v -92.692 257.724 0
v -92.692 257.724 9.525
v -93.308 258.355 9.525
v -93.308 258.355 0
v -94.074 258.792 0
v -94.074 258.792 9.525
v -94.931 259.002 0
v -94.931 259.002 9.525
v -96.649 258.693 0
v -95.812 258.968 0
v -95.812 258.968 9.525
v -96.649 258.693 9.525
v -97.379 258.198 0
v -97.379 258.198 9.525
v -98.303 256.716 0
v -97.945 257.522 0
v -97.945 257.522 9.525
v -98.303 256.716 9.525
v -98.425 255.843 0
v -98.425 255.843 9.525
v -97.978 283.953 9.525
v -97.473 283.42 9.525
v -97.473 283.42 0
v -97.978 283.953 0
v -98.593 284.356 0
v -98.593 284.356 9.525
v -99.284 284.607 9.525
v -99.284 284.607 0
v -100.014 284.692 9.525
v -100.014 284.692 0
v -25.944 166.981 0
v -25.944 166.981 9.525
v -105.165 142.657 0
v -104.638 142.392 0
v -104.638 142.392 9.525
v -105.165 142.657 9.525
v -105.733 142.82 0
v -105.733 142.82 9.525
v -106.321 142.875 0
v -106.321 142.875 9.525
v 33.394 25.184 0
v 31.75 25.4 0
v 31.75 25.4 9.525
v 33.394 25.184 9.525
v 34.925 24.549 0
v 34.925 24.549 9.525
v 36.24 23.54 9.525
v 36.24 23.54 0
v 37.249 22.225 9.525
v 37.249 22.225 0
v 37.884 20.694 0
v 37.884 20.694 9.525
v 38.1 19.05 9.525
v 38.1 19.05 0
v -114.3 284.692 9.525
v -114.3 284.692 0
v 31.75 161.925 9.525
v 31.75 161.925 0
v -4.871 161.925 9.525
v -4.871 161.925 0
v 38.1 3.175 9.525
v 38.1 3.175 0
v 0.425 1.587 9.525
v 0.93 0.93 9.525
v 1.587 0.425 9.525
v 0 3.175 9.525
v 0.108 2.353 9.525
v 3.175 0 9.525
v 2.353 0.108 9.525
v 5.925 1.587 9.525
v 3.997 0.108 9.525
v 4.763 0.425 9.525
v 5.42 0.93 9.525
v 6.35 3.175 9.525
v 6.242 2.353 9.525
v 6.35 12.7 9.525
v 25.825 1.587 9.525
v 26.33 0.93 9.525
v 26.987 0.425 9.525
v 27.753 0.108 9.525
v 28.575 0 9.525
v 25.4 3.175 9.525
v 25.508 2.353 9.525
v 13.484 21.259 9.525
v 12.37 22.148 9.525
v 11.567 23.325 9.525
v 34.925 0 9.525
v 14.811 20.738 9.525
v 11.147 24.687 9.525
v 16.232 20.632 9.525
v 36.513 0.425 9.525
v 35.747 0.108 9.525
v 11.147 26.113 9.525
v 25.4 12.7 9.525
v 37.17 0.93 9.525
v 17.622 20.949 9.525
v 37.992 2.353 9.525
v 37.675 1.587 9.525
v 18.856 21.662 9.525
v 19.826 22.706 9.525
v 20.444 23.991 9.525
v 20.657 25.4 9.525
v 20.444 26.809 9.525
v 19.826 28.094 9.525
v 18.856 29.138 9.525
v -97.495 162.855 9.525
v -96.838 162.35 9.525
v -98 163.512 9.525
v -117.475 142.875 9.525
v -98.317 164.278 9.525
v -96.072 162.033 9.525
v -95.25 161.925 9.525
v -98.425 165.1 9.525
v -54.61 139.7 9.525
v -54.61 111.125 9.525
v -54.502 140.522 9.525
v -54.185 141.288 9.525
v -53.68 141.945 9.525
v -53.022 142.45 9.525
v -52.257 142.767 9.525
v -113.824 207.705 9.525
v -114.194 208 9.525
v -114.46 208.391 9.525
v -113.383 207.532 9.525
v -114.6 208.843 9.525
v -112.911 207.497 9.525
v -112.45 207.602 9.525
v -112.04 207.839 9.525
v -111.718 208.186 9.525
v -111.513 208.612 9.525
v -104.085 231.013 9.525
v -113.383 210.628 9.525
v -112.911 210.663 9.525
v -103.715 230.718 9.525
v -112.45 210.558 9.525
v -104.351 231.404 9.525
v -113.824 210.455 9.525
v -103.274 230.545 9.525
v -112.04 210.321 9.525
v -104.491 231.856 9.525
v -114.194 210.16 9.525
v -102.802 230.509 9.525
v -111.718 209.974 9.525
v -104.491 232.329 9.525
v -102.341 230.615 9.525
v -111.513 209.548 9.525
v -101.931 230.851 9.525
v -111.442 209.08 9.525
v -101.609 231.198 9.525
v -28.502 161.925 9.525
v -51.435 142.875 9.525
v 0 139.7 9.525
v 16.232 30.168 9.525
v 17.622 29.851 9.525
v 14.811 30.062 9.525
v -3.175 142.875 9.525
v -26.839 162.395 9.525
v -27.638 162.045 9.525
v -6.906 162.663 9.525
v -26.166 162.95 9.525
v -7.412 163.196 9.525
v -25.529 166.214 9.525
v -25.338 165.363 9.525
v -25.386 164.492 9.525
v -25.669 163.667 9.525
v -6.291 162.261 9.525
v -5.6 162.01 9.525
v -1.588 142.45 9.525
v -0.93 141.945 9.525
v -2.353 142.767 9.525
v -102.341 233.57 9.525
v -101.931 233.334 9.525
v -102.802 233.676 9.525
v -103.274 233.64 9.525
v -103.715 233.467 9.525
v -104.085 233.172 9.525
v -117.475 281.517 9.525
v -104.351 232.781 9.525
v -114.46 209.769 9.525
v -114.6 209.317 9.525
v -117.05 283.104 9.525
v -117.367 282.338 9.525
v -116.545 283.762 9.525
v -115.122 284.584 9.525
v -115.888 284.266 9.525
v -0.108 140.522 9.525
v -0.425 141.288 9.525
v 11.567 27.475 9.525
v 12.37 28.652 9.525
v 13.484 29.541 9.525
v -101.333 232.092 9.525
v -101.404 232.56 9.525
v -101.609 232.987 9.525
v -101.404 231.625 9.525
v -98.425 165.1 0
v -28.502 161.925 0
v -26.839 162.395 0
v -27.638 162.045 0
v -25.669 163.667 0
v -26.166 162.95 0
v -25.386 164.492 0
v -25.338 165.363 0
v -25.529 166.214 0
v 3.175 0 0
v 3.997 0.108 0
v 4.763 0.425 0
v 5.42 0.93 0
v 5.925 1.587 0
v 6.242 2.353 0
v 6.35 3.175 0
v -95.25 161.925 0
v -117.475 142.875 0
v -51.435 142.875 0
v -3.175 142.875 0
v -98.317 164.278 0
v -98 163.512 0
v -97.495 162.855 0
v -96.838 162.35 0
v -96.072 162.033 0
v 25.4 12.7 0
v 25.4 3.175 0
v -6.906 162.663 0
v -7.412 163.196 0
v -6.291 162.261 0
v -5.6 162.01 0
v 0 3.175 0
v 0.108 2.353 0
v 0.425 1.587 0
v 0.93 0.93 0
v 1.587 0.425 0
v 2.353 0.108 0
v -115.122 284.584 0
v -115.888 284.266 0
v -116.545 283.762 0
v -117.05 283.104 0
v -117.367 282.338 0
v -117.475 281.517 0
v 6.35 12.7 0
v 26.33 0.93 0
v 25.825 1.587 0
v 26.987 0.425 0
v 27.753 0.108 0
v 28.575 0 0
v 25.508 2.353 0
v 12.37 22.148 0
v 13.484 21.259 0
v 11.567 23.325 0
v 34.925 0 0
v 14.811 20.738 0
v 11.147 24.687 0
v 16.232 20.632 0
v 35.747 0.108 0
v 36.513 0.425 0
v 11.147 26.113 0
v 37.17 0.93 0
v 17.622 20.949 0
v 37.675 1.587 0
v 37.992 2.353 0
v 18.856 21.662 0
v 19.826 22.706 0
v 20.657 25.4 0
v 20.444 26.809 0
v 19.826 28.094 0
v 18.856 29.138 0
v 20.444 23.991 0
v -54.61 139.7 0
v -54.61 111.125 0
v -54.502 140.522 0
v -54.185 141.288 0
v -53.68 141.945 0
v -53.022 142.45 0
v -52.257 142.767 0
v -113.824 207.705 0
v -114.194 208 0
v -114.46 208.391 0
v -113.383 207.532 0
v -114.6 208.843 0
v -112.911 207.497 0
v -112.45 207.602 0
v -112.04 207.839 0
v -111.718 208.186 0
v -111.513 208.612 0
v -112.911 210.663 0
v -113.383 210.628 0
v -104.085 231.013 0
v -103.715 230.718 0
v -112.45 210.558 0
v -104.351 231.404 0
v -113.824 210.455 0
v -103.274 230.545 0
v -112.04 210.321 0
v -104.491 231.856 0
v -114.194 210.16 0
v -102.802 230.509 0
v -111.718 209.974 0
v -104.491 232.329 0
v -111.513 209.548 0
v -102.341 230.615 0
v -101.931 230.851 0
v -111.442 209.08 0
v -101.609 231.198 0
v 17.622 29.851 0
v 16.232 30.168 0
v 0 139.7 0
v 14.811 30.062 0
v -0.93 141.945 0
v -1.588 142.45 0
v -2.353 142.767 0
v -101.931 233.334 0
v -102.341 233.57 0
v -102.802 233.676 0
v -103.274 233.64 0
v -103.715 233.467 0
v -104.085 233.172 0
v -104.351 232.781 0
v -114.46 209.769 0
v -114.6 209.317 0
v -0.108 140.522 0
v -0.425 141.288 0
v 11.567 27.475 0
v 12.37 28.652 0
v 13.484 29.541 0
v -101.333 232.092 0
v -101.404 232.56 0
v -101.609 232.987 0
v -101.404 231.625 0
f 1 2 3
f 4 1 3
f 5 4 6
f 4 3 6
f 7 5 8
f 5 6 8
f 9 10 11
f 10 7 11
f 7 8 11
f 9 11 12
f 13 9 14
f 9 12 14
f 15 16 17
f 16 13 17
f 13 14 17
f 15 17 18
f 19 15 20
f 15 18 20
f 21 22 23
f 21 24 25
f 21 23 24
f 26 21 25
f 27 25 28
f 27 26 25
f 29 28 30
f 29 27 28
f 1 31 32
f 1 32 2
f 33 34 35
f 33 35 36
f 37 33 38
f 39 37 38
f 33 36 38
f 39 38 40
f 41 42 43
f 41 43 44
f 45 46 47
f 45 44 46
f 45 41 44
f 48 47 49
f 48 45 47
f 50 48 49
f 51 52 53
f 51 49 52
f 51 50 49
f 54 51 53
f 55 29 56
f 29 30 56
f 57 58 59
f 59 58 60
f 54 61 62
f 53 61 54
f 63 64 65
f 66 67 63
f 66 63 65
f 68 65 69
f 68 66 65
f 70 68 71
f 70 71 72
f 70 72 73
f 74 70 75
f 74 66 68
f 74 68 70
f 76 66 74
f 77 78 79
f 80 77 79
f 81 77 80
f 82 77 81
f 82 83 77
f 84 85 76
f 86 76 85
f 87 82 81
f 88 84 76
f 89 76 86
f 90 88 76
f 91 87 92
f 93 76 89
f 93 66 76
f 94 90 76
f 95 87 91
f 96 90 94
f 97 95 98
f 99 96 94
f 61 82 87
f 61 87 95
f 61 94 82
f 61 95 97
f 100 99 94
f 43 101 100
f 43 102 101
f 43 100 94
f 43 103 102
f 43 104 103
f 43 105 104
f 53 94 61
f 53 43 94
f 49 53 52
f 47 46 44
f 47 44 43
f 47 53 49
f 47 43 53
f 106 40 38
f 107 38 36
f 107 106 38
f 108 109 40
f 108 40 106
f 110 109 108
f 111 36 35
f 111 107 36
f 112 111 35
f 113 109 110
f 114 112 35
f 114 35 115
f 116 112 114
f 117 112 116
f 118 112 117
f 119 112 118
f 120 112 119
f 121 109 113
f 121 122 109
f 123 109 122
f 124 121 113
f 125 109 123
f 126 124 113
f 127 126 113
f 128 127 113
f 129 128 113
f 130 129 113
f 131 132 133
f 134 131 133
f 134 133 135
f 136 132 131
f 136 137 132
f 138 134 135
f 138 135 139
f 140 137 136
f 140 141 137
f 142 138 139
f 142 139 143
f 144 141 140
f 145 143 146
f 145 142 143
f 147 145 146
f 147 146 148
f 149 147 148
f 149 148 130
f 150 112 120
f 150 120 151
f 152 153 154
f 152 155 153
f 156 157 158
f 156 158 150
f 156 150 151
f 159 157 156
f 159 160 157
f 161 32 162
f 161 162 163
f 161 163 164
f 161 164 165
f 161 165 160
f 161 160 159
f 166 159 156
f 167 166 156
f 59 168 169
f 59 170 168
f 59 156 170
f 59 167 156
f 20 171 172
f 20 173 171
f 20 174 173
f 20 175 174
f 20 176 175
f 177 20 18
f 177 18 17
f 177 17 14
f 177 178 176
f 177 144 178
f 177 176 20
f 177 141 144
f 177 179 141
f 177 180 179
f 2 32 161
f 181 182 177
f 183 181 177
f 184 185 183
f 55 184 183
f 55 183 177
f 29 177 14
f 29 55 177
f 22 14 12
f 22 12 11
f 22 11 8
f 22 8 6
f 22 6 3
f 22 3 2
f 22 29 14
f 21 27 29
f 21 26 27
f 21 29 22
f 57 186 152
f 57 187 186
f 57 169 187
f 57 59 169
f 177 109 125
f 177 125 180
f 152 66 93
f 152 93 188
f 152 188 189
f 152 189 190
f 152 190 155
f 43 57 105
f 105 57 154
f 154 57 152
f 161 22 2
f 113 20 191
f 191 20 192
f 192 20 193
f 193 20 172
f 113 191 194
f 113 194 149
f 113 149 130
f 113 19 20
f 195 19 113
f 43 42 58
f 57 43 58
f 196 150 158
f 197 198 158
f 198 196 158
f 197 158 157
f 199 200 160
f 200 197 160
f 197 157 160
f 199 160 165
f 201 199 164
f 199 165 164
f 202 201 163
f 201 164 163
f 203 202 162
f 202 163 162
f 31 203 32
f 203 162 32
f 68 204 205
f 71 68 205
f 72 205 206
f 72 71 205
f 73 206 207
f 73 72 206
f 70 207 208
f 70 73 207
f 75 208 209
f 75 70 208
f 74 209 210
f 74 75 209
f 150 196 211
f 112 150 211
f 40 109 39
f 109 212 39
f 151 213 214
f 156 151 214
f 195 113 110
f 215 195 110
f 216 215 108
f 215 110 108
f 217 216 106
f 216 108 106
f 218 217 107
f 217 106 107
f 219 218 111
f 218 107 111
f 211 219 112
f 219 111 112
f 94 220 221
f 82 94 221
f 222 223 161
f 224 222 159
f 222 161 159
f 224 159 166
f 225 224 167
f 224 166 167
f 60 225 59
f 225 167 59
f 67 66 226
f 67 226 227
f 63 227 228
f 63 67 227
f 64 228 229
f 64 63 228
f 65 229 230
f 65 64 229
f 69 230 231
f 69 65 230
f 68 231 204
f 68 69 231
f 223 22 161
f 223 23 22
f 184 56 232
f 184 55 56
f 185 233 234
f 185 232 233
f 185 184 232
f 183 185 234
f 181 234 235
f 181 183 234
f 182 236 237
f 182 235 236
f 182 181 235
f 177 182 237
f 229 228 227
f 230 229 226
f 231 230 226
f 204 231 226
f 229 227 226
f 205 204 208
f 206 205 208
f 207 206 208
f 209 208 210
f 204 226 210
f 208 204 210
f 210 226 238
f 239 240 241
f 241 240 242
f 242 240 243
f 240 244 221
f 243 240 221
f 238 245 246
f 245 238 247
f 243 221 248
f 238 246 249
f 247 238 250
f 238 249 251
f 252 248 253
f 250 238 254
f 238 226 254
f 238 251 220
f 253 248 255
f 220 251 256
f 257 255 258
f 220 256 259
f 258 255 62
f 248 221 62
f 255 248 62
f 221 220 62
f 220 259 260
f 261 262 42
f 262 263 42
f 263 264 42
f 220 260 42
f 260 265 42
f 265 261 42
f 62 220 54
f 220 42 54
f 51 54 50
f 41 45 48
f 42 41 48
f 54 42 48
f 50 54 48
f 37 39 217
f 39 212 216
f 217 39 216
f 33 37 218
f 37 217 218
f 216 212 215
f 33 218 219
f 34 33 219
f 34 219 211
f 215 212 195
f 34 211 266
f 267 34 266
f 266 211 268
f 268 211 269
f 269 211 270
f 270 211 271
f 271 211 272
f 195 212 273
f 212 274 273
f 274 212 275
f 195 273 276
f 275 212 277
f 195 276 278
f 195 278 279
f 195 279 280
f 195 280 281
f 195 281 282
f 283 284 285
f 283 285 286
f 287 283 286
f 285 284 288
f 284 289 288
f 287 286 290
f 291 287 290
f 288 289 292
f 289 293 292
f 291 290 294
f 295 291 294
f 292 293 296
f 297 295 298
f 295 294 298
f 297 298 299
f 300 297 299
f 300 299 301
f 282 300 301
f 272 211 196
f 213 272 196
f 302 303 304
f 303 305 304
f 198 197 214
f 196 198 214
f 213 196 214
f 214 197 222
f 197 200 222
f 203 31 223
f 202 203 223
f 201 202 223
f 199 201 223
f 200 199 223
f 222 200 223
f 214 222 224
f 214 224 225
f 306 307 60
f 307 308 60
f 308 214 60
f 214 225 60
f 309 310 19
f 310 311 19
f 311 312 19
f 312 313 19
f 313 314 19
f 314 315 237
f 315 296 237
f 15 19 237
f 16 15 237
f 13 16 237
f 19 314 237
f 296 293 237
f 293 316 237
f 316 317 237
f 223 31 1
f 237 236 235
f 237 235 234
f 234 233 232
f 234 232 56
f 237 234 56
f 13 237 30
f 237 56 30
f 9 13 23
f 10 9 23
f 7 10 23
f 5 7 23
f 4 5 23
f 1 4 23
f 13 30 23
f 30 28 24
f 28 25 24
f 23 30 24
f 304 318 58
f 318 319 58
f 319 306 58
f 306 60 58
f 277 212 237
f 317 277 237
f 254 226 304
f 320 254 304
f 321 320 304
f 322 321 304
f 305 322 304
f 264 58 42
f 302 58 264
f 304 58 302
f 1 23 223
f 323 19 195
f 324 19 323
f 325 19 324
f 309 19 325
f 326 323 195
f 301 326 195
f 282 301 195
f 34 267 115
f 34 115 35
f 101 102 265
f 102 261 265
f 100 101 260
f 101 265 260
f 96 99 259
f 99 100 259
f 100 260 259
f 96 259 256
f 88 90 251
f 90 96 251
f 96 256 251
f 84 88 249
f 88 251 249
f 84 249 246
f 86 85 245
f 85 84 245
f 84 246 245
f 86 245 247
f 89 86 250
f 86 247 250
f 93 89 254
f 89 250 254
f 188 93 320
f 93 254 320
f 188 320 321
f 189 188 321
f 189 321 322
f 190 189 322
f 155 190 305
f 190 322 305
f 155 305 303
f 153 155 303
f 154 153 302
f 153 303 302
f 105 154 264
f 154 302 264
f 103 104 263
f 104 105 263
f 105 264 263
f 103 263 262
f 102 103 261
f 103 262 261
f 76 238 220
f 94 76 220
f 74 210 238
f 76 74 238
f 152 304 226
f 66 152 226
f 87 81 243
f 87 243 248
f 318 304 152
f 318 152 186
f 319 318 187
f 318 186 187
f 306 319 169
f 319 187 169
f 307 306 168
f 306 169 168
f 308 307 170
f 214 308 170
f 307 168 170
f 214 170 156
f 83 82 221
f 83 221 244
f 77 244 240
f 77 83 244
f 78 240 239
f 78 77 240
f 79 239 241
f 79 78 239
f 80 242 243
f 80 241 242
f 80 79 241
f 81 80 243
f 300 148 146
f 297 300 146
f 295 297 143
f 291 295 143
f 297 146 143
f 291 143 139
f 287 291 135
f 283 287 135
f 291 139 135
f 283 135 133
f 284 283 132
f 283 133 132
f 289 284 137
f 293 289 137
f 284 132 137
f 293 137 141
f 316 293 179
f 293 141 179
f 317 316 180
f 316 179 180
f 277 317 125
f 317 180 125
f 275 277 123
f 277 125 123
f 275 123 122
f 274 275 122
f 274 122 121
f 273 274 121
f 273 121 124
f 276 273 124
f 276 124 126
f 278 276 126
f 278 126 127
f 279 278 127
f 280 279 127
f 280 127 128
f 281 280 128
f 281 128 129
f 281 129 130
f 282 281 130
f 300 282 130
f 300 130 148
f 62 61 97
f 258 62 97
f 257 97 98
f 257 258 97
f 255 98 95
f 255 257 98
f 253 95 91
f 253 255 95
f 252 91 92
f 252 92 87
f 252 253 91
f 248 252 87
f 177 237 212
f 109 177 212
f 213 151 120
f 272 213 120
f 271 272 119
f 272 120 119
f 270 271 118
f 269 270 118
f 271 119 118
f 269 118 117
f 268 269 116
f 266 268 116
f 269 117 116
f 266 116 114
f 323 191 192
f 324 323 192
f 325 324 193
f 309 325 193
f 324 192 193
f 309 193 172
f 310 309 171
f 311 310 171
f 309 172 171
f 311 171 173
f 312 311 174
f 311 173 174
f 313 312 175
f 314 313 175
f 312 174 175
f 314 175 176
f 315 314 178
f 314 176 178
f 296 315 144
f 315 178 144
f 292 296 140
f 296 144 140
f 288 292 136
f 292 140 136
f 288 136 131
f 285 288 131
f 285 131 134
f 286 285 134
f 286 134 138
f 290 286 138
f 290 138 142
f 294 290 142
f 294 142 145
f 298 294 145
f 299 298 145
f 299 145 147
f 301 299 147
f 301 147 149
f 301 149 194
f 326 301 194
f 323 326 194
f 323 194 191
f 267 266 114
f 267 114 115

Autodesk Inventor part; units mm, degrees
ref_plane "YZ Plane" through (0, 0, 0) normal (1, 0, 0) x (0, 1, 0)
ref_plane "XZ Plane" through (0, 0, 0) normal (0, 1, 0) x (-1, 0, 0)
ref_plane "XY Plane" through (0, 0, 0) normal (0, 0, 1) x (1, 0, 0)
ref_plane "Work Plane1" through (0, 0, 9.525) normal (0, 0, 1) x (1, 0, 0)
sketch "Sketch1" plane through (0, 0, 0) normal (0, 0, 1) x (1, 0, 0)
  line L0 (0, 0) -> (6.35, 0)
  line L1 (6.35, 0) -> (6.35, 12.7)
  line L2 (6.35, 12.7) -> (25.4, 12.7)
  line L3 (25.4, 12.7) -> (25.4, 0)
  line L4 (25.4, 0) -> (31.75, 0)
  line L5 (31.75, 0) -> (31.75, 161.925)
  circle A0 centre (15.875, 25.4) radius 4.7816
  line L6 (-117.475, 161.925) -> (-117.475, 142.875)
  line L7 (0, 142.875) -> (0, 0)
  line L8 (-117.475, 142.875) -> (-117.475, 284.6917)
  line L9 (-54.61, 142.875) -> (-54.61, 111.125)
  line L10 (-54.61, 111.125) -> (-105.41, 142.875)
  line L11 (-117.475, 142.875) -> (-105.41, 142.875)
  line L12 (-54.61, 142.875) -> (0, 142.875)
  line L13 (-98.425, 284.6917) -> (-117.475, 284.6917)
  line L14 (-98.425, 265.5175) -> (-98.425, 256.0855)
  line L15 (-98.425, 238.125) -> (-98.425, 161.925)
  line L16 (31.75, 161.925) -> (-6.4592, 161.925)
  line L17 (-22.225, 161.925) -> (-98.425, 161.925)
  line L18 (-98.425, 284.6917) -> (-6.4592, 161.925)
  line L19 (-22.225, 161.925) -> (-98.425, 265.5175)
  line L20 (-98.425, 238.125) -> (-98.425, 256.0855)
  line L21 (31.75, 25.4) -> (31.75, 38.1)
  line L22 (31.75, 38.1) -> (0, 38.1) construction
  point P0 (-98.425, 263.525)
  point P1 (-6.35, 161.925)
  dimension "d0" = 6.35
  dimension "d1" = 12.7
  dimension "d2" = 19.05
  dimension "d3" = 6.35
  dimension "d4" = 161.925
  dimension "d5" = 9.5631
  dimension "d6" = 12.7
  dimension "d7" = 9.525
  dimension "d8" = 149.225
  dimension "d9" = 19.05
  dimension "d12" = 54.61
  dimension "d13" = 31.75
  dimension "d14" = 50.8
  dimension "d34" = 122.7667
  dimension "d37" = 19.05
  dimension "d38" = 19.05
  dimension "d39" = 76.2
  dimension "d40" = 76.2
  dimension "d41" = 19.05
  dimension "d50" = 0.5
  dimension "d51" = 12.7
  dimension "d61" = 12.7
sketch "Sketch2" plane through (0, 0, 9.525) normal (0, 0, 1) x (1, 0, 0)
  line L0 (-98.425, 298.45) -> (-117.475, 298.45) projected
  line L1 (-117.475, 284.6917) -> (-117.475, 142.875) projected
  circle A0 centre (-102.9208, 232.0925) radius 1.5875
  circle A1 centre (-113.03, 209.0801) radius 1.5875
  dimension "d24" = 3.175
  dimension "d25" = 14.5542
  dimension "d26" = 66.3575
  dimension "d27" = 3.175
  dimension "d29" = 89.3699
  dimension "d32" = 4.445
extrude "Extrusion4" add sketch "Sketch1" along normal blind 9.525
extrude "Extrusion5" cut sketch "Sketch2" against normal blind 9.525
fillet "Fillet2" radius 3.175 1 edges at (0, 142.875, 4.7625)
fillet "Fillet3" radius 3.175 1 edges at (-54.61, 142.875, 4.7625)
fillet "Fillet4" radius 3.175 1 edges at (-105.41, 142.875, 4.7625)
fillet "Fillet5" radius 3.175 6 edges at (-117.475, 284.6917, 4.7625) (-98.425, 284.6917, 4.7625) (-6.4592, 161.925, 4.7625) (-22.225, 161.925, 4.7625) (-98.425, 161.925, 4.7625) (-98.425, 265.5175, 4.7625)
sketch "Sketch4" plane through (0, 0, 9.525) normal (0, 0, 1) x (1, 0, 0)
  arc A0 (-97.4725, 283.4202) -> (-100.0136, 284.6917) centre (-100.0136, 281.5167) ccw projected
  line L0 (-100.0136, 284.6917) -> (-114.3, 284.6917) projected
  arc A1 (-114.3, 284.6917) -> (-117.475, 281.5167) centre (-114.3, 281.5167) ccw projected
  line L1 (-117.475, 281.5167) -> (-117.475, 142.875) projected
  line L2 (-117.475, 142.875) -> (-106.3206, 142.875) projected
  arc A2 (-104.6378, 142.3924) -> (-106.3206, 142.875) centre (-106.3206, 139.7) ccw projected
  line L3 (-104.6378, 142.3924) -> (-54.61, 111.125) projected
  line L4 (-54.61, 111.125) -> (-54.61, 139.7) projected
  arc A3 (-51.435, 142.875) -> (-54.61, 139.7) centre (-51.435, 139.7) ccw projected
  line L5 (-51.435, 142.875) -> (-3.175, 142.875) projected
  arc A4 (0, 139.7) -> (-3.175, 142.875) centre (-3.175, 139.7) ccw projected
  line L6 (0, 139.7) -> (0, 0) projected
  line L7 (0, 0) -> (6.35, 0) projected
  line L8 (6.35, 0) -> (6.35, 12.7) projected
  line L9 (6.35, 12.7) -> (25.4, 12.7) projected
  line L10 (25.4, 12.7) -> (25.4, 0) projected
  line L11 (25.4, 0) -> (31.75, 0) projected
  line L12 (31.75, 0) -> (31.75, 161.925) projected
  line L13 (31.75, 161.925) -> (-4.8706, 161.925) projected
  arc A5 (-7.4117, 163.1964) -> (-4.8706, 161.925) centre (-4.8706, 165.1) ccw projected
  line L14 (-7.4117, 163.1964) -> (-97.4725, 283.4202) projected
  line L15 (25.4, 0) -> (38.1, 0)
  line L16 (38.1, 0) -> (38.1, 25.4)
  line L17 (38.1, 25.4) -> (31.75, 25.4)
  dimension "d56" = 12.7
extrude "Extrusion7" add sketch "Sketch4" against normal blind 9.525 contours L17 L16 L15 L12
fillet "Fillet6" radius 3.175 4 edges at (38.1, 0, 4.7625) (25.4, 0, 4.7625) (6.35, 0, 4.7625) (0, 0, 4.7625)
fillet "Fillet7" radius 6.35 1 edges at (38.1, 25.4, 4.7625)
sketch "Sketch5" plane through (0, 0, 9.525) normal (0, 0, 1) x (1, 0, 0)
  arc A0 (38.1, 19.05) -> (31.75, 25.4) centre (31.75, 19.05) ccw projected
  line L0 (31.75, 25.4) -> (31.75, 161.925) projected
  line L1 (31.75, 161.925) -> (-4.8706, 161.925) projected
  arc A1 (-7.4117, 163.1964) -> (-4.8706, 161.925) centre (-4.8706, 165.1) ccw projected
  line L2 (-7.4117, 163.1964) -> (-97.4725, 283.4202) projected
  arc A2 (-97.4725, 283.4202) -> (-100.0136, 284.6917) centre (-100.0136, 281.5167) ccw projected
  line L3 (-100.0136, 284.6917) -> (-114.3, 284.6917) projected
  arc A3 (-114.3, 284.6917) -> (-117.475, 281.5167) centre (-114.3, 281.5167) ccw projected
  line L4 (-117.475, 281.5167) -> (-117.475, 142.875) projected
  line L5 (-117.475, 142.875) -> (-106.3206, 142.875) projected
  arc A4 (-104.6378, 142.3924) -> (-106.3206, 142.875) centre (-106.3206, 139.7) ccw projected
  line L6 (-104.6378, 142.3924) -> (-54.61, 111.125) projected
  line L7 (-54.61, 111.125) -> (-54.61, 139.7) projected
  arc A5 (-51.435, 142.875) -> (-54.61, 139.7) centre (-51.435, 139.7) ccw projected
  line L8 (-51.435, 142.875) -> (-3.175, 142.875) projected
  arc A6 (0, 139.7) -> (-3.175, 142.875) centre (-3.175, 139.7) ccw projected
  line L9 (0, 139.7) -> (0, 3.175) projected
  arc A7 (0, 3.175) -> (6.35, 3.175) centre (3.175, 3.175) ccw projected
  line L10 (6.35, 3.175) -> (6.35, 12.7) projected
  line L11 (6.35, 12.7) -> (25.4, 12.7) projected
  line L12 (25.4, 12.7) -> (25.4, 3.175) projected
  arc A8 (25.4, 3.175) -> (28.575, 0) centre (28.575, 3.175) ccw projected
  line L13 (28.575, 0) -> (34.925, 0) projected
  arc A9 (34.925, 0) -> (38.1, 3.175) centre (34.925, 3.175) ccw projected
  line L14 (38.1, 3.175) -> (38.1, 19.05) projected
  circle A10 centre (15.875, 25.4) radius 4.7816 projected
  line L15 (-98.425, 165.1) -> (-98.425, 255.8428) projected
  arc A11 (-92.6924, 257.7241) -> (-98.425, 255.8428) centre (-95.25, 255.8428) ccw projected
  line L16 (-92.6924, 257.7241) -> (-25.9443, 166.9813) projected
  arc A12 (-28.5019, 161.925) -> (-25.9443, 166.9813) centre (-28.5019, 165.1) ccw projected
  line L17 (-28.5019, 161.925) -> (-95.25, 161.925) projected
  arc A13 (-98.425, 165.1) -> (-95.25, 161.925) centre (-95.25, 165.1) ccw projected
  circle A14 centre (-113.03, 209.0801) radius 1.5875 projected
  circle A15 centre (-102.9208, 232.0925) radius 1.5875 projected
  point P0 (0, 0)
properties part number "Right Climber Hook"
